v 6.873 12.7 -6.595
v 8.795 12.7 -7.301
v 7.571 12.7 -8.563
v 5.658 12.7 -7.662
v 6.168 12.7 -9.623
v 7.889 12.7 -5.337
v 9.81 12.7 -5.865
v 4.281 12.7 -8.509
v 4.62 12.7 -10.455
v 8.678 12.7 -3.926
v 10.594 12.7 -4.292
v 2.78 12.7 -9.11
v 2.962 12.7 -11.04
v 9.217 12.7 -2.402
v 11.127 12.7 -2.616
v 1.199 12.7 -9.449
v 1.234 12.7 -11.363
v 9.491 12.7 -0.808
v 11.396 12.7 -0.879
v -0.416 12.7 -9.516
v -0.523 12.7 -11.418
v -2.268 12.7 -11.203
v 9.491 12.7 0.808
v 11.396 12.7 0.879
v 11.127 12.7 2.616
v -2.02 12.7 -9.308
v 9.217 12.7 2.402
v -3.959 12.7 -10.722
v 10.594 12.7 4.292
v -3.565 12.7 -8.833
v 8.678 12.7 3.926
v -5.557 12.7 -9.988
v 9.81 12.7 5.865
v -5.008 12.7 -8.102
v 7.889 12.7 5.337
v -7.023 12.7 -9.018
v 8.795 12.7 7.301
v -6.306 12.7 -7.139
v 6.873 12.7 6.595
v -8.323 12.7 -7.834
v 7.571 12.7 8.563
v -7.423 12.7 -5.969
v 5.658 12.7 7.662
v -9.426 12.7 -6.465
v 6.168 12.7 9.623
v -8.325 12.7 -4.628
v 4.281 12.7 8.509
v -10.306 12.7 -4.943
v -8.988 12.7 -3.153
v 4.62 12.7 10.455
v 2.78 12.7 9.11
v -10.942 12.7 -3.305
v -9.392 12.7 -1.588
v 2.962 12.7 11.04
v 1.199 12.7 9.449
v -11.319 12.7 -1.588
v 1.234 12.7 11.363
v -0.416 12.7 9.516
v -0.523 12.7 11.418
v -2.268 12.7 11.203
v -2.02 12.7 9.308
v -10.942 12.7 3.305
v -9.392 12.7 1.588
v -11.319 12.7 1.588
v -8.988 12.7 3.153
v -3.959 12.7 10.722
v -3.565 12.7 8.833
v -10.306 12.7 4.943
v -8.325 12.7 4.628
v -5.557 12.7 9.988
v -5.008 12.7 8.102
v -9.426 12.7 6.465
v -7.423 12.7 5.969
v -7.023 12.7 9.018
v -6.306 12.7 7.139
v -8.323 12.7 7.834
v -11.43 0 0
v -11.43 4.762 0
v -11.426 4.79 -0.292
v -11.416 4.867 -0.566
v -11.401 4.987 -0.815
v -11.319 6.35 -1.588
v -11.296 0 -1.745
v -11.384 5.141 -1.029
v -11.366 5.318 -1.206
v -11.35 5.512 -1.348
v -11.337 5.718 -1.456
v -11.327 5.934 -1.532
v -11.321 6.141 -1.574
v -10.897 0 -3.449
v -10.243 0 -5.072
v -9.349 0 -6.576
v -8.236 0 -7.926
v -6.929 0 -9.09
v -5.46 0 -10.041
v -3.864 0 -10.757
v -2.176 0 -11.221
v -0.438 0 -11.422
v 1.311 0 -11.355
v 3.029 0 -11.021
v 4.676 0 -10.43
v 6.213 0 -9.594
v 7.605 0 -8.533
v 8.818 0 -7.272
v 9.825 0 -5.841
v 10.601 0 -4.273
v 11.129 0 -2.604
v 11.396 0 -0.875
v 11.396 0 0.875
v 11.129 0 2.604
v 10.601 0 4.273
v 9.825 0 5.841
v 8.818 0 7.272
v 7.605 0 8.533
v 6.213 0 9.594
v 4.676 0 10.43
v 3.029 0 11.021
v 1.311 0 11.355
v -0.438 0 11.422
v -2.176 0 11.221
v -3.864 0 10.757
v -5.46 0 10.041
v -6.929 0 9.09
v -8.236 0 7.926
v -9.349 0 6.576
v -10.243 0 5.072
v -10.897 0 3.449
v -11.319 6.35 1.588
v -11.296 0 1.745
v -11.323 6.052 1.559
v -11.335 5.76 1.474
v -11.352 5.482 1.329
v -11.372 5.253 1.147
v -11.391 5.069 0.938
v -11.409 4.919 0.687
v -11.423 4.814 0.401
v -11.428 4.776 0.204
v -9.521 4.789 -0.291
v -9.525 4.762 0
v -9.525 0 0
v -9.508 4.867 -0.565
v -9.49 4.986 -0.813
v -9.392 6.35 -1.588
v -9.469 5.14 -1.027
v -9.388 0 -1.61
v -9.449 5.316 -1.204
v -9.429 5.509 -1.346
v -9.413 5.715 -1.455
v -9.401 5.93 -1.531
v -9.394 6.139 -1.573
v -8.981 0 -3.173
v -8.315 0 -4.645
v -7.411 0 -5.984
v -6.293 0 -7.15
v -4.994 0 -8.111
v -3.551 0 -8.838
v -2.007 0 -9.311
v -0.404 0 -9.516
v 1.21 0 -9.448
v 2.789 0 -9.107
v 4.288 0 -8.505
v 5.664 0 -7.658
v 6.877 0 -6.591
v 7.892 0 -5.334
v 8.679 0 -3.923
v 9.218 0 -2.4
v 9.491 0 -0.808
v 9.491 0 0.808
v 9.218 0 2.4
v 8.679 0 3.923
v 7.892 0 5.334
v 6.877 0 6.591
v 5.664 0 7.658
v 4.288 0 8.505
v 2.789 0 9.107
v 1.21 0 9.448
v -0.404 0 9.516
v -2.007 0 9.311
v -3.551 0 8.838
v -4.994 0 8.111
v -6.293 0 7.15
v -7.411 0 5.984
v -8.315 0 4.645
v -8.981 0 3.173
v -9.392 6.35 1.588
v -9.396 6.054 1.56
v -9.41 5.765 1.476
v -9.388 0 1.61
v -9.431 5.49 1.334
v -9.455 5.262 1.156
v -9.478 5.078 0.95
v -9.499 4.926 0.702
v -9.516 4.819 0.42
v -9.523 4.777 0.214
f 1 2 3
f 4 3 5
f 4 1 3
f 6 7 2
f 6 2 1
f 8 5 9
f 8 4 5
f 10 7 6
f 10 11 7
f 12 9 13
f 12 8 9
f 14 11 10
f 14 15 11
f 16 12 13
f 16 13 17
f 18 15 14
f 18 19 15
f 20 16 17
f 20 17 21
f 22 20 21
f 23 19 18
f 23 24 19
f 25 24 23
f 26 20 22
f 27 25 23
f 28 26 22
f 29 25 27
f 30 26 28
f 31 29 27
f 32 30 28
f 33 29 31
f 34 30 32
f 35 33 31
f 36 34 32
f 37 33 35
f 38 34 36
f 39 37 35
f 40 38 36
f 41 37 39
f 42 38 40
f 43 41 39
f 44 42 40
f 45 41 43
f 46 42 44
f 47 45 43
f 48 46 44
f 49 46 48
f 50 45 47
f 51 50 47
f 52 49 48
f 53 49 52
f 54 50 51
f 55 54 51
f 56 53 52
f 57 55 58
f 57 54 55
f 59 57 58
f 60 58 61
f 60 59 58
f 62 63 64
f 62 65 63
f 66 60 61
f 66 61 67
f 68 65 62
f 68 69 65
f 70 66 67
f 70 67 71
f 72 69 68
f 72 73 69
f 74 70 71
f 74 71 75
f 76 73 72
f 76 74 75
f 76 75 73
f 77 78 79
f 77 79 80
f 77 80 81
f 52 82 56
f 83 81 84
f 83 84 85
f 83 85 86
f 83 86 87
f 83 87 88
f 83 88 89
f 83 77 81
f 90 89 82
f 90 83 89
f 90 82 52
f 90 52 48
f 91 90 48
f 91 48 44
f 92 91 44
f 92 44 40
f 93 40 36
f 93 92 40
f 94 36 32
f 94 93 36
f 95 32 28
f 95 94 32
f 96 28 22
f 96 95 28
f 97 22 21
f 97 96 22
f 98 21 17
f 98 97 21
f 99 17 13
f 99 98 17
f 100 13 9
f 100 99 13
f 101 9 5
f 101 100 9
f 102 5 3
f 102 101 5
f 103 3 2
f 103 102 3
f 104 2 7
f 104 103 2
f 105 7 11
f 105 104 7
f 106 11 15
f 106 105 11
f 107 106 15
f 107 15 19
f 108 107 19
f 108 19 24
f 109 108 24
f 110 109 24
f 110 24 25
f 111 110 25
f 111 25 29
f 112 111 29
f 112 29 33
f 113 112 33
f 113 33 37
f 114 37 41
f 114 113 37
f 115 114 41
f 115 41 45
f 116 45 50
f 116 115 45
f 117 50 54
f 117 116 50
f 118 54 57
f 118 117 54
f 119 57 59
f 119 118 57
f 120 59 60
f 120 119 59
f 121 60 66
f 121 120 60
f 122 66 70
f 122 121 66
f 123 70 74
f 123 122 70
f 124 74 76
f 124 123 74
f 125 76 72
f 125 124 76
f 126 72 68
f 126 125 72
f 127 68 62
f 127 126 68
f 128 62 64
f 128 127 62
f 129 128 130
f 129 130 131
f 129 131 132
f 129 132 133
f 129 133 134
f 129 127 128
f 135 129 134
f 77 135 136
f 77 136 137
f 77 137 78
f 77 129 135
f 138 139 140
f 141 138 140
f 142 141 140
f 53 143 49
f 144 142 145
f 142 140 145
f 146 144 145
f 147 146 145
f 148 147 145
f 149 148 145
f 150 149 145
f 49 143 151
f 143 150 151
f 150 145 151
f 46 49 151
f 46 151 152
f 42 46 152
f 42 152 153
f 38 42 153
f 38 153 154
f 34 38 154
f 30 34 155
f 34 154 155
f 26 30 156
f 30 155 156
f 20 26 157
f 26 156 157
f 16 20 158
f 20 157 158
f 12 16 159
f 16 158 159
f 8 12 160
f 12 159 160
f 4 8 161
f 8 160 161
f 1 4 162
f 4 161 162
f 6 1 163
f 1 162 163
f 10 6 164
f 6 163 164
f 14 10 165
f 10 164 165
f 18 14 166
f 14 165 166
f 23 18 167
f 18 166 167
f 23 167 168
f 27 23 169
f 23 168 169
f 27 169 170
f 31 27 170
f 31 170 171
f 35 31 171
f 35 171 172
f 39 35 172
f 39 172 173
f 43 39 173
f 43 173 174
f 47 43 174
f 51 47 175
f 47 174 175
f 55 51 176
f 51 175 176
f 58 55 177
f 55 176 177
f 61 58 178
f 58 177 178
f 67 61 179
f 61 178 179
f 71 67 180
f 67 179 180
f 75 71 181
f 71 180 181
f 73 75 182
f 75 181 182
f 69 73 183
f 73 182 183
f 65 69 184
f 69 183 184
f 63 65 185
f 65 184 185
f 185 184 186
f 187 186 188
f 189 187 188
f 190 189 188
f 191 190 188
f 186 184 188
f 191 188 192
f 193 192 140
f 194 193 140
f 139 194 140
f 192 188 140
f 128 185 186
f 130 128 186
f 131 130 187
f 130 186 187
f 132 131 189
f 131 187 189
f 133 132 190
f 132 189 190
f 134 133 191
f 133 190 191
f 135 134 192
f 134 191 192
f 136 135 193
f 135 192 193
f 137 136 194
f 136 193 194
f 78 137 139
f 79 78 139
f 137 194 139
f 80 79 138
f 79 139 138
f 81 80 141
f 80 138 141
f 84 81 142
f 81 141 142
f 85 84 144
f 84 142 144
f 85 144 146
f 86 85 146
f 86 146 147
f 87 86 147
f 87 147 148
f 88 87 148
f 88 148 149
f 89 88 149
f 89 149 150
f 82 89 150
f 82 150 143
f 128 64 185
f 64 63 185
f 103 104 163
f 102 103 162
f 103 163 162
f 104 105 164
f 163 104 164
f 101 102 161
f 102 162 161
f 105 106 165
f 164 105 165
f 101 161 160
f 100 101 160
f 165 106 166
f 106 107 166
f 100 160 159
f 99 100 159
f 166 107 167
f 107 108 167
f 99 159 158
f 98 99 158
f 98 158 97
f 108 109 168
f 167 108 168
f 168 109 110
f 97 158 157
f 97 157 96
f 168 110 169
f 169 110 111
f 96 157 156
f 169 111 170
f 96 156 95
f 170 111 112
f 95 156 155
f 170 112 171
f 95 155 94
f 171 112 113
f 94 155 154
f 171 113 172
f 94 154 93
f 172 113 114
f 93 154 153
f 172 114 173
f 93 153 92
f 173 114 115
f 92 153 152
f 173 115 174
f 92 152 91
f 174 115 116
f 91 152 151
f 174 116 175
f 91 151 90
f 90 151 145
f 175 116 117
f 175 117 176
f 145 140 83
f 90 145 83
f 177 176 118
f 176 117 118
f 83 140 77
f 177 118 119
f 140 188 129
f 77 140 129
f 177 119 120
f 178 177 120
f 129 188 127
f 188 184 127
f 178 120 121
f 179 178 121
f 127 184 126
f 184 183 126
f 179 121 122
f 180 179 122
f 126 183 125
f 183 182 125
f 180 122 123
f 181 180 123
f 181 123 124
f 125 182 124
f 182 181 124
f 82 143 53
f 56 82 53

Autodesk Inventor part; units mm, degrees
ref_plane "YZ Plane" through (0, 0, 0) normal (1, 0, 0) x (0, 1, 0)
ref_plane "XZ Plane" through (0, 0, 0) normal (0, 1, 0) x (-1, 0, 0)
ref_plane "XY Plane" through (0, 0, 0) normal (0, 0, 1) x (1, 0, 0)
sketch "Sketch1" plane through (0, 0, 0) normal (0, 1, 0) x (-1, 0, 0)
  circle A0 centre (0, 0) radius 11.43
  circle A1 centre (0, 0) radius 9.525
  dimension "d0" = 19.05
  dimension "d1" = 22.86
extrude "Extrusion1" add sketch "Sketch1" along normal blind 12.7
sketch "Sketch2" plane through (0, 12.7, 0) normal (0, 1, 0) x (1, 0, 0)
  point P0 (0, 0)
sketch "Sketch3" plane through (0, 0, 0) normal (1, 0, 0) x (0, 1, 0)
  line L0 (12.7, -11.43) -> (12.7, 11.43) projected
  line L1 (12.7, 1.5875) -> (6.35, 1.5875)
  line L2 (6.35, -1.5875) -> (12.7, -1.5875)
  line L3 (12.7, 1.5875) -> (12.7, -1.5875)
  arc A0 (6.35, 1.5875) -> (6.35, -1.5875) centre (6.35, 0) ccw
  point P0 (0, 0)
  point P1 (9.525, -1.5875)
  point P2 (12.7, 0)
  dimension "d4" = 3.175
  dimension "d5" = 6.35
extrude "Extrusion2" cut sketch "Sketch3" against normal blind 12.7
properties part number "smallinsert1"
